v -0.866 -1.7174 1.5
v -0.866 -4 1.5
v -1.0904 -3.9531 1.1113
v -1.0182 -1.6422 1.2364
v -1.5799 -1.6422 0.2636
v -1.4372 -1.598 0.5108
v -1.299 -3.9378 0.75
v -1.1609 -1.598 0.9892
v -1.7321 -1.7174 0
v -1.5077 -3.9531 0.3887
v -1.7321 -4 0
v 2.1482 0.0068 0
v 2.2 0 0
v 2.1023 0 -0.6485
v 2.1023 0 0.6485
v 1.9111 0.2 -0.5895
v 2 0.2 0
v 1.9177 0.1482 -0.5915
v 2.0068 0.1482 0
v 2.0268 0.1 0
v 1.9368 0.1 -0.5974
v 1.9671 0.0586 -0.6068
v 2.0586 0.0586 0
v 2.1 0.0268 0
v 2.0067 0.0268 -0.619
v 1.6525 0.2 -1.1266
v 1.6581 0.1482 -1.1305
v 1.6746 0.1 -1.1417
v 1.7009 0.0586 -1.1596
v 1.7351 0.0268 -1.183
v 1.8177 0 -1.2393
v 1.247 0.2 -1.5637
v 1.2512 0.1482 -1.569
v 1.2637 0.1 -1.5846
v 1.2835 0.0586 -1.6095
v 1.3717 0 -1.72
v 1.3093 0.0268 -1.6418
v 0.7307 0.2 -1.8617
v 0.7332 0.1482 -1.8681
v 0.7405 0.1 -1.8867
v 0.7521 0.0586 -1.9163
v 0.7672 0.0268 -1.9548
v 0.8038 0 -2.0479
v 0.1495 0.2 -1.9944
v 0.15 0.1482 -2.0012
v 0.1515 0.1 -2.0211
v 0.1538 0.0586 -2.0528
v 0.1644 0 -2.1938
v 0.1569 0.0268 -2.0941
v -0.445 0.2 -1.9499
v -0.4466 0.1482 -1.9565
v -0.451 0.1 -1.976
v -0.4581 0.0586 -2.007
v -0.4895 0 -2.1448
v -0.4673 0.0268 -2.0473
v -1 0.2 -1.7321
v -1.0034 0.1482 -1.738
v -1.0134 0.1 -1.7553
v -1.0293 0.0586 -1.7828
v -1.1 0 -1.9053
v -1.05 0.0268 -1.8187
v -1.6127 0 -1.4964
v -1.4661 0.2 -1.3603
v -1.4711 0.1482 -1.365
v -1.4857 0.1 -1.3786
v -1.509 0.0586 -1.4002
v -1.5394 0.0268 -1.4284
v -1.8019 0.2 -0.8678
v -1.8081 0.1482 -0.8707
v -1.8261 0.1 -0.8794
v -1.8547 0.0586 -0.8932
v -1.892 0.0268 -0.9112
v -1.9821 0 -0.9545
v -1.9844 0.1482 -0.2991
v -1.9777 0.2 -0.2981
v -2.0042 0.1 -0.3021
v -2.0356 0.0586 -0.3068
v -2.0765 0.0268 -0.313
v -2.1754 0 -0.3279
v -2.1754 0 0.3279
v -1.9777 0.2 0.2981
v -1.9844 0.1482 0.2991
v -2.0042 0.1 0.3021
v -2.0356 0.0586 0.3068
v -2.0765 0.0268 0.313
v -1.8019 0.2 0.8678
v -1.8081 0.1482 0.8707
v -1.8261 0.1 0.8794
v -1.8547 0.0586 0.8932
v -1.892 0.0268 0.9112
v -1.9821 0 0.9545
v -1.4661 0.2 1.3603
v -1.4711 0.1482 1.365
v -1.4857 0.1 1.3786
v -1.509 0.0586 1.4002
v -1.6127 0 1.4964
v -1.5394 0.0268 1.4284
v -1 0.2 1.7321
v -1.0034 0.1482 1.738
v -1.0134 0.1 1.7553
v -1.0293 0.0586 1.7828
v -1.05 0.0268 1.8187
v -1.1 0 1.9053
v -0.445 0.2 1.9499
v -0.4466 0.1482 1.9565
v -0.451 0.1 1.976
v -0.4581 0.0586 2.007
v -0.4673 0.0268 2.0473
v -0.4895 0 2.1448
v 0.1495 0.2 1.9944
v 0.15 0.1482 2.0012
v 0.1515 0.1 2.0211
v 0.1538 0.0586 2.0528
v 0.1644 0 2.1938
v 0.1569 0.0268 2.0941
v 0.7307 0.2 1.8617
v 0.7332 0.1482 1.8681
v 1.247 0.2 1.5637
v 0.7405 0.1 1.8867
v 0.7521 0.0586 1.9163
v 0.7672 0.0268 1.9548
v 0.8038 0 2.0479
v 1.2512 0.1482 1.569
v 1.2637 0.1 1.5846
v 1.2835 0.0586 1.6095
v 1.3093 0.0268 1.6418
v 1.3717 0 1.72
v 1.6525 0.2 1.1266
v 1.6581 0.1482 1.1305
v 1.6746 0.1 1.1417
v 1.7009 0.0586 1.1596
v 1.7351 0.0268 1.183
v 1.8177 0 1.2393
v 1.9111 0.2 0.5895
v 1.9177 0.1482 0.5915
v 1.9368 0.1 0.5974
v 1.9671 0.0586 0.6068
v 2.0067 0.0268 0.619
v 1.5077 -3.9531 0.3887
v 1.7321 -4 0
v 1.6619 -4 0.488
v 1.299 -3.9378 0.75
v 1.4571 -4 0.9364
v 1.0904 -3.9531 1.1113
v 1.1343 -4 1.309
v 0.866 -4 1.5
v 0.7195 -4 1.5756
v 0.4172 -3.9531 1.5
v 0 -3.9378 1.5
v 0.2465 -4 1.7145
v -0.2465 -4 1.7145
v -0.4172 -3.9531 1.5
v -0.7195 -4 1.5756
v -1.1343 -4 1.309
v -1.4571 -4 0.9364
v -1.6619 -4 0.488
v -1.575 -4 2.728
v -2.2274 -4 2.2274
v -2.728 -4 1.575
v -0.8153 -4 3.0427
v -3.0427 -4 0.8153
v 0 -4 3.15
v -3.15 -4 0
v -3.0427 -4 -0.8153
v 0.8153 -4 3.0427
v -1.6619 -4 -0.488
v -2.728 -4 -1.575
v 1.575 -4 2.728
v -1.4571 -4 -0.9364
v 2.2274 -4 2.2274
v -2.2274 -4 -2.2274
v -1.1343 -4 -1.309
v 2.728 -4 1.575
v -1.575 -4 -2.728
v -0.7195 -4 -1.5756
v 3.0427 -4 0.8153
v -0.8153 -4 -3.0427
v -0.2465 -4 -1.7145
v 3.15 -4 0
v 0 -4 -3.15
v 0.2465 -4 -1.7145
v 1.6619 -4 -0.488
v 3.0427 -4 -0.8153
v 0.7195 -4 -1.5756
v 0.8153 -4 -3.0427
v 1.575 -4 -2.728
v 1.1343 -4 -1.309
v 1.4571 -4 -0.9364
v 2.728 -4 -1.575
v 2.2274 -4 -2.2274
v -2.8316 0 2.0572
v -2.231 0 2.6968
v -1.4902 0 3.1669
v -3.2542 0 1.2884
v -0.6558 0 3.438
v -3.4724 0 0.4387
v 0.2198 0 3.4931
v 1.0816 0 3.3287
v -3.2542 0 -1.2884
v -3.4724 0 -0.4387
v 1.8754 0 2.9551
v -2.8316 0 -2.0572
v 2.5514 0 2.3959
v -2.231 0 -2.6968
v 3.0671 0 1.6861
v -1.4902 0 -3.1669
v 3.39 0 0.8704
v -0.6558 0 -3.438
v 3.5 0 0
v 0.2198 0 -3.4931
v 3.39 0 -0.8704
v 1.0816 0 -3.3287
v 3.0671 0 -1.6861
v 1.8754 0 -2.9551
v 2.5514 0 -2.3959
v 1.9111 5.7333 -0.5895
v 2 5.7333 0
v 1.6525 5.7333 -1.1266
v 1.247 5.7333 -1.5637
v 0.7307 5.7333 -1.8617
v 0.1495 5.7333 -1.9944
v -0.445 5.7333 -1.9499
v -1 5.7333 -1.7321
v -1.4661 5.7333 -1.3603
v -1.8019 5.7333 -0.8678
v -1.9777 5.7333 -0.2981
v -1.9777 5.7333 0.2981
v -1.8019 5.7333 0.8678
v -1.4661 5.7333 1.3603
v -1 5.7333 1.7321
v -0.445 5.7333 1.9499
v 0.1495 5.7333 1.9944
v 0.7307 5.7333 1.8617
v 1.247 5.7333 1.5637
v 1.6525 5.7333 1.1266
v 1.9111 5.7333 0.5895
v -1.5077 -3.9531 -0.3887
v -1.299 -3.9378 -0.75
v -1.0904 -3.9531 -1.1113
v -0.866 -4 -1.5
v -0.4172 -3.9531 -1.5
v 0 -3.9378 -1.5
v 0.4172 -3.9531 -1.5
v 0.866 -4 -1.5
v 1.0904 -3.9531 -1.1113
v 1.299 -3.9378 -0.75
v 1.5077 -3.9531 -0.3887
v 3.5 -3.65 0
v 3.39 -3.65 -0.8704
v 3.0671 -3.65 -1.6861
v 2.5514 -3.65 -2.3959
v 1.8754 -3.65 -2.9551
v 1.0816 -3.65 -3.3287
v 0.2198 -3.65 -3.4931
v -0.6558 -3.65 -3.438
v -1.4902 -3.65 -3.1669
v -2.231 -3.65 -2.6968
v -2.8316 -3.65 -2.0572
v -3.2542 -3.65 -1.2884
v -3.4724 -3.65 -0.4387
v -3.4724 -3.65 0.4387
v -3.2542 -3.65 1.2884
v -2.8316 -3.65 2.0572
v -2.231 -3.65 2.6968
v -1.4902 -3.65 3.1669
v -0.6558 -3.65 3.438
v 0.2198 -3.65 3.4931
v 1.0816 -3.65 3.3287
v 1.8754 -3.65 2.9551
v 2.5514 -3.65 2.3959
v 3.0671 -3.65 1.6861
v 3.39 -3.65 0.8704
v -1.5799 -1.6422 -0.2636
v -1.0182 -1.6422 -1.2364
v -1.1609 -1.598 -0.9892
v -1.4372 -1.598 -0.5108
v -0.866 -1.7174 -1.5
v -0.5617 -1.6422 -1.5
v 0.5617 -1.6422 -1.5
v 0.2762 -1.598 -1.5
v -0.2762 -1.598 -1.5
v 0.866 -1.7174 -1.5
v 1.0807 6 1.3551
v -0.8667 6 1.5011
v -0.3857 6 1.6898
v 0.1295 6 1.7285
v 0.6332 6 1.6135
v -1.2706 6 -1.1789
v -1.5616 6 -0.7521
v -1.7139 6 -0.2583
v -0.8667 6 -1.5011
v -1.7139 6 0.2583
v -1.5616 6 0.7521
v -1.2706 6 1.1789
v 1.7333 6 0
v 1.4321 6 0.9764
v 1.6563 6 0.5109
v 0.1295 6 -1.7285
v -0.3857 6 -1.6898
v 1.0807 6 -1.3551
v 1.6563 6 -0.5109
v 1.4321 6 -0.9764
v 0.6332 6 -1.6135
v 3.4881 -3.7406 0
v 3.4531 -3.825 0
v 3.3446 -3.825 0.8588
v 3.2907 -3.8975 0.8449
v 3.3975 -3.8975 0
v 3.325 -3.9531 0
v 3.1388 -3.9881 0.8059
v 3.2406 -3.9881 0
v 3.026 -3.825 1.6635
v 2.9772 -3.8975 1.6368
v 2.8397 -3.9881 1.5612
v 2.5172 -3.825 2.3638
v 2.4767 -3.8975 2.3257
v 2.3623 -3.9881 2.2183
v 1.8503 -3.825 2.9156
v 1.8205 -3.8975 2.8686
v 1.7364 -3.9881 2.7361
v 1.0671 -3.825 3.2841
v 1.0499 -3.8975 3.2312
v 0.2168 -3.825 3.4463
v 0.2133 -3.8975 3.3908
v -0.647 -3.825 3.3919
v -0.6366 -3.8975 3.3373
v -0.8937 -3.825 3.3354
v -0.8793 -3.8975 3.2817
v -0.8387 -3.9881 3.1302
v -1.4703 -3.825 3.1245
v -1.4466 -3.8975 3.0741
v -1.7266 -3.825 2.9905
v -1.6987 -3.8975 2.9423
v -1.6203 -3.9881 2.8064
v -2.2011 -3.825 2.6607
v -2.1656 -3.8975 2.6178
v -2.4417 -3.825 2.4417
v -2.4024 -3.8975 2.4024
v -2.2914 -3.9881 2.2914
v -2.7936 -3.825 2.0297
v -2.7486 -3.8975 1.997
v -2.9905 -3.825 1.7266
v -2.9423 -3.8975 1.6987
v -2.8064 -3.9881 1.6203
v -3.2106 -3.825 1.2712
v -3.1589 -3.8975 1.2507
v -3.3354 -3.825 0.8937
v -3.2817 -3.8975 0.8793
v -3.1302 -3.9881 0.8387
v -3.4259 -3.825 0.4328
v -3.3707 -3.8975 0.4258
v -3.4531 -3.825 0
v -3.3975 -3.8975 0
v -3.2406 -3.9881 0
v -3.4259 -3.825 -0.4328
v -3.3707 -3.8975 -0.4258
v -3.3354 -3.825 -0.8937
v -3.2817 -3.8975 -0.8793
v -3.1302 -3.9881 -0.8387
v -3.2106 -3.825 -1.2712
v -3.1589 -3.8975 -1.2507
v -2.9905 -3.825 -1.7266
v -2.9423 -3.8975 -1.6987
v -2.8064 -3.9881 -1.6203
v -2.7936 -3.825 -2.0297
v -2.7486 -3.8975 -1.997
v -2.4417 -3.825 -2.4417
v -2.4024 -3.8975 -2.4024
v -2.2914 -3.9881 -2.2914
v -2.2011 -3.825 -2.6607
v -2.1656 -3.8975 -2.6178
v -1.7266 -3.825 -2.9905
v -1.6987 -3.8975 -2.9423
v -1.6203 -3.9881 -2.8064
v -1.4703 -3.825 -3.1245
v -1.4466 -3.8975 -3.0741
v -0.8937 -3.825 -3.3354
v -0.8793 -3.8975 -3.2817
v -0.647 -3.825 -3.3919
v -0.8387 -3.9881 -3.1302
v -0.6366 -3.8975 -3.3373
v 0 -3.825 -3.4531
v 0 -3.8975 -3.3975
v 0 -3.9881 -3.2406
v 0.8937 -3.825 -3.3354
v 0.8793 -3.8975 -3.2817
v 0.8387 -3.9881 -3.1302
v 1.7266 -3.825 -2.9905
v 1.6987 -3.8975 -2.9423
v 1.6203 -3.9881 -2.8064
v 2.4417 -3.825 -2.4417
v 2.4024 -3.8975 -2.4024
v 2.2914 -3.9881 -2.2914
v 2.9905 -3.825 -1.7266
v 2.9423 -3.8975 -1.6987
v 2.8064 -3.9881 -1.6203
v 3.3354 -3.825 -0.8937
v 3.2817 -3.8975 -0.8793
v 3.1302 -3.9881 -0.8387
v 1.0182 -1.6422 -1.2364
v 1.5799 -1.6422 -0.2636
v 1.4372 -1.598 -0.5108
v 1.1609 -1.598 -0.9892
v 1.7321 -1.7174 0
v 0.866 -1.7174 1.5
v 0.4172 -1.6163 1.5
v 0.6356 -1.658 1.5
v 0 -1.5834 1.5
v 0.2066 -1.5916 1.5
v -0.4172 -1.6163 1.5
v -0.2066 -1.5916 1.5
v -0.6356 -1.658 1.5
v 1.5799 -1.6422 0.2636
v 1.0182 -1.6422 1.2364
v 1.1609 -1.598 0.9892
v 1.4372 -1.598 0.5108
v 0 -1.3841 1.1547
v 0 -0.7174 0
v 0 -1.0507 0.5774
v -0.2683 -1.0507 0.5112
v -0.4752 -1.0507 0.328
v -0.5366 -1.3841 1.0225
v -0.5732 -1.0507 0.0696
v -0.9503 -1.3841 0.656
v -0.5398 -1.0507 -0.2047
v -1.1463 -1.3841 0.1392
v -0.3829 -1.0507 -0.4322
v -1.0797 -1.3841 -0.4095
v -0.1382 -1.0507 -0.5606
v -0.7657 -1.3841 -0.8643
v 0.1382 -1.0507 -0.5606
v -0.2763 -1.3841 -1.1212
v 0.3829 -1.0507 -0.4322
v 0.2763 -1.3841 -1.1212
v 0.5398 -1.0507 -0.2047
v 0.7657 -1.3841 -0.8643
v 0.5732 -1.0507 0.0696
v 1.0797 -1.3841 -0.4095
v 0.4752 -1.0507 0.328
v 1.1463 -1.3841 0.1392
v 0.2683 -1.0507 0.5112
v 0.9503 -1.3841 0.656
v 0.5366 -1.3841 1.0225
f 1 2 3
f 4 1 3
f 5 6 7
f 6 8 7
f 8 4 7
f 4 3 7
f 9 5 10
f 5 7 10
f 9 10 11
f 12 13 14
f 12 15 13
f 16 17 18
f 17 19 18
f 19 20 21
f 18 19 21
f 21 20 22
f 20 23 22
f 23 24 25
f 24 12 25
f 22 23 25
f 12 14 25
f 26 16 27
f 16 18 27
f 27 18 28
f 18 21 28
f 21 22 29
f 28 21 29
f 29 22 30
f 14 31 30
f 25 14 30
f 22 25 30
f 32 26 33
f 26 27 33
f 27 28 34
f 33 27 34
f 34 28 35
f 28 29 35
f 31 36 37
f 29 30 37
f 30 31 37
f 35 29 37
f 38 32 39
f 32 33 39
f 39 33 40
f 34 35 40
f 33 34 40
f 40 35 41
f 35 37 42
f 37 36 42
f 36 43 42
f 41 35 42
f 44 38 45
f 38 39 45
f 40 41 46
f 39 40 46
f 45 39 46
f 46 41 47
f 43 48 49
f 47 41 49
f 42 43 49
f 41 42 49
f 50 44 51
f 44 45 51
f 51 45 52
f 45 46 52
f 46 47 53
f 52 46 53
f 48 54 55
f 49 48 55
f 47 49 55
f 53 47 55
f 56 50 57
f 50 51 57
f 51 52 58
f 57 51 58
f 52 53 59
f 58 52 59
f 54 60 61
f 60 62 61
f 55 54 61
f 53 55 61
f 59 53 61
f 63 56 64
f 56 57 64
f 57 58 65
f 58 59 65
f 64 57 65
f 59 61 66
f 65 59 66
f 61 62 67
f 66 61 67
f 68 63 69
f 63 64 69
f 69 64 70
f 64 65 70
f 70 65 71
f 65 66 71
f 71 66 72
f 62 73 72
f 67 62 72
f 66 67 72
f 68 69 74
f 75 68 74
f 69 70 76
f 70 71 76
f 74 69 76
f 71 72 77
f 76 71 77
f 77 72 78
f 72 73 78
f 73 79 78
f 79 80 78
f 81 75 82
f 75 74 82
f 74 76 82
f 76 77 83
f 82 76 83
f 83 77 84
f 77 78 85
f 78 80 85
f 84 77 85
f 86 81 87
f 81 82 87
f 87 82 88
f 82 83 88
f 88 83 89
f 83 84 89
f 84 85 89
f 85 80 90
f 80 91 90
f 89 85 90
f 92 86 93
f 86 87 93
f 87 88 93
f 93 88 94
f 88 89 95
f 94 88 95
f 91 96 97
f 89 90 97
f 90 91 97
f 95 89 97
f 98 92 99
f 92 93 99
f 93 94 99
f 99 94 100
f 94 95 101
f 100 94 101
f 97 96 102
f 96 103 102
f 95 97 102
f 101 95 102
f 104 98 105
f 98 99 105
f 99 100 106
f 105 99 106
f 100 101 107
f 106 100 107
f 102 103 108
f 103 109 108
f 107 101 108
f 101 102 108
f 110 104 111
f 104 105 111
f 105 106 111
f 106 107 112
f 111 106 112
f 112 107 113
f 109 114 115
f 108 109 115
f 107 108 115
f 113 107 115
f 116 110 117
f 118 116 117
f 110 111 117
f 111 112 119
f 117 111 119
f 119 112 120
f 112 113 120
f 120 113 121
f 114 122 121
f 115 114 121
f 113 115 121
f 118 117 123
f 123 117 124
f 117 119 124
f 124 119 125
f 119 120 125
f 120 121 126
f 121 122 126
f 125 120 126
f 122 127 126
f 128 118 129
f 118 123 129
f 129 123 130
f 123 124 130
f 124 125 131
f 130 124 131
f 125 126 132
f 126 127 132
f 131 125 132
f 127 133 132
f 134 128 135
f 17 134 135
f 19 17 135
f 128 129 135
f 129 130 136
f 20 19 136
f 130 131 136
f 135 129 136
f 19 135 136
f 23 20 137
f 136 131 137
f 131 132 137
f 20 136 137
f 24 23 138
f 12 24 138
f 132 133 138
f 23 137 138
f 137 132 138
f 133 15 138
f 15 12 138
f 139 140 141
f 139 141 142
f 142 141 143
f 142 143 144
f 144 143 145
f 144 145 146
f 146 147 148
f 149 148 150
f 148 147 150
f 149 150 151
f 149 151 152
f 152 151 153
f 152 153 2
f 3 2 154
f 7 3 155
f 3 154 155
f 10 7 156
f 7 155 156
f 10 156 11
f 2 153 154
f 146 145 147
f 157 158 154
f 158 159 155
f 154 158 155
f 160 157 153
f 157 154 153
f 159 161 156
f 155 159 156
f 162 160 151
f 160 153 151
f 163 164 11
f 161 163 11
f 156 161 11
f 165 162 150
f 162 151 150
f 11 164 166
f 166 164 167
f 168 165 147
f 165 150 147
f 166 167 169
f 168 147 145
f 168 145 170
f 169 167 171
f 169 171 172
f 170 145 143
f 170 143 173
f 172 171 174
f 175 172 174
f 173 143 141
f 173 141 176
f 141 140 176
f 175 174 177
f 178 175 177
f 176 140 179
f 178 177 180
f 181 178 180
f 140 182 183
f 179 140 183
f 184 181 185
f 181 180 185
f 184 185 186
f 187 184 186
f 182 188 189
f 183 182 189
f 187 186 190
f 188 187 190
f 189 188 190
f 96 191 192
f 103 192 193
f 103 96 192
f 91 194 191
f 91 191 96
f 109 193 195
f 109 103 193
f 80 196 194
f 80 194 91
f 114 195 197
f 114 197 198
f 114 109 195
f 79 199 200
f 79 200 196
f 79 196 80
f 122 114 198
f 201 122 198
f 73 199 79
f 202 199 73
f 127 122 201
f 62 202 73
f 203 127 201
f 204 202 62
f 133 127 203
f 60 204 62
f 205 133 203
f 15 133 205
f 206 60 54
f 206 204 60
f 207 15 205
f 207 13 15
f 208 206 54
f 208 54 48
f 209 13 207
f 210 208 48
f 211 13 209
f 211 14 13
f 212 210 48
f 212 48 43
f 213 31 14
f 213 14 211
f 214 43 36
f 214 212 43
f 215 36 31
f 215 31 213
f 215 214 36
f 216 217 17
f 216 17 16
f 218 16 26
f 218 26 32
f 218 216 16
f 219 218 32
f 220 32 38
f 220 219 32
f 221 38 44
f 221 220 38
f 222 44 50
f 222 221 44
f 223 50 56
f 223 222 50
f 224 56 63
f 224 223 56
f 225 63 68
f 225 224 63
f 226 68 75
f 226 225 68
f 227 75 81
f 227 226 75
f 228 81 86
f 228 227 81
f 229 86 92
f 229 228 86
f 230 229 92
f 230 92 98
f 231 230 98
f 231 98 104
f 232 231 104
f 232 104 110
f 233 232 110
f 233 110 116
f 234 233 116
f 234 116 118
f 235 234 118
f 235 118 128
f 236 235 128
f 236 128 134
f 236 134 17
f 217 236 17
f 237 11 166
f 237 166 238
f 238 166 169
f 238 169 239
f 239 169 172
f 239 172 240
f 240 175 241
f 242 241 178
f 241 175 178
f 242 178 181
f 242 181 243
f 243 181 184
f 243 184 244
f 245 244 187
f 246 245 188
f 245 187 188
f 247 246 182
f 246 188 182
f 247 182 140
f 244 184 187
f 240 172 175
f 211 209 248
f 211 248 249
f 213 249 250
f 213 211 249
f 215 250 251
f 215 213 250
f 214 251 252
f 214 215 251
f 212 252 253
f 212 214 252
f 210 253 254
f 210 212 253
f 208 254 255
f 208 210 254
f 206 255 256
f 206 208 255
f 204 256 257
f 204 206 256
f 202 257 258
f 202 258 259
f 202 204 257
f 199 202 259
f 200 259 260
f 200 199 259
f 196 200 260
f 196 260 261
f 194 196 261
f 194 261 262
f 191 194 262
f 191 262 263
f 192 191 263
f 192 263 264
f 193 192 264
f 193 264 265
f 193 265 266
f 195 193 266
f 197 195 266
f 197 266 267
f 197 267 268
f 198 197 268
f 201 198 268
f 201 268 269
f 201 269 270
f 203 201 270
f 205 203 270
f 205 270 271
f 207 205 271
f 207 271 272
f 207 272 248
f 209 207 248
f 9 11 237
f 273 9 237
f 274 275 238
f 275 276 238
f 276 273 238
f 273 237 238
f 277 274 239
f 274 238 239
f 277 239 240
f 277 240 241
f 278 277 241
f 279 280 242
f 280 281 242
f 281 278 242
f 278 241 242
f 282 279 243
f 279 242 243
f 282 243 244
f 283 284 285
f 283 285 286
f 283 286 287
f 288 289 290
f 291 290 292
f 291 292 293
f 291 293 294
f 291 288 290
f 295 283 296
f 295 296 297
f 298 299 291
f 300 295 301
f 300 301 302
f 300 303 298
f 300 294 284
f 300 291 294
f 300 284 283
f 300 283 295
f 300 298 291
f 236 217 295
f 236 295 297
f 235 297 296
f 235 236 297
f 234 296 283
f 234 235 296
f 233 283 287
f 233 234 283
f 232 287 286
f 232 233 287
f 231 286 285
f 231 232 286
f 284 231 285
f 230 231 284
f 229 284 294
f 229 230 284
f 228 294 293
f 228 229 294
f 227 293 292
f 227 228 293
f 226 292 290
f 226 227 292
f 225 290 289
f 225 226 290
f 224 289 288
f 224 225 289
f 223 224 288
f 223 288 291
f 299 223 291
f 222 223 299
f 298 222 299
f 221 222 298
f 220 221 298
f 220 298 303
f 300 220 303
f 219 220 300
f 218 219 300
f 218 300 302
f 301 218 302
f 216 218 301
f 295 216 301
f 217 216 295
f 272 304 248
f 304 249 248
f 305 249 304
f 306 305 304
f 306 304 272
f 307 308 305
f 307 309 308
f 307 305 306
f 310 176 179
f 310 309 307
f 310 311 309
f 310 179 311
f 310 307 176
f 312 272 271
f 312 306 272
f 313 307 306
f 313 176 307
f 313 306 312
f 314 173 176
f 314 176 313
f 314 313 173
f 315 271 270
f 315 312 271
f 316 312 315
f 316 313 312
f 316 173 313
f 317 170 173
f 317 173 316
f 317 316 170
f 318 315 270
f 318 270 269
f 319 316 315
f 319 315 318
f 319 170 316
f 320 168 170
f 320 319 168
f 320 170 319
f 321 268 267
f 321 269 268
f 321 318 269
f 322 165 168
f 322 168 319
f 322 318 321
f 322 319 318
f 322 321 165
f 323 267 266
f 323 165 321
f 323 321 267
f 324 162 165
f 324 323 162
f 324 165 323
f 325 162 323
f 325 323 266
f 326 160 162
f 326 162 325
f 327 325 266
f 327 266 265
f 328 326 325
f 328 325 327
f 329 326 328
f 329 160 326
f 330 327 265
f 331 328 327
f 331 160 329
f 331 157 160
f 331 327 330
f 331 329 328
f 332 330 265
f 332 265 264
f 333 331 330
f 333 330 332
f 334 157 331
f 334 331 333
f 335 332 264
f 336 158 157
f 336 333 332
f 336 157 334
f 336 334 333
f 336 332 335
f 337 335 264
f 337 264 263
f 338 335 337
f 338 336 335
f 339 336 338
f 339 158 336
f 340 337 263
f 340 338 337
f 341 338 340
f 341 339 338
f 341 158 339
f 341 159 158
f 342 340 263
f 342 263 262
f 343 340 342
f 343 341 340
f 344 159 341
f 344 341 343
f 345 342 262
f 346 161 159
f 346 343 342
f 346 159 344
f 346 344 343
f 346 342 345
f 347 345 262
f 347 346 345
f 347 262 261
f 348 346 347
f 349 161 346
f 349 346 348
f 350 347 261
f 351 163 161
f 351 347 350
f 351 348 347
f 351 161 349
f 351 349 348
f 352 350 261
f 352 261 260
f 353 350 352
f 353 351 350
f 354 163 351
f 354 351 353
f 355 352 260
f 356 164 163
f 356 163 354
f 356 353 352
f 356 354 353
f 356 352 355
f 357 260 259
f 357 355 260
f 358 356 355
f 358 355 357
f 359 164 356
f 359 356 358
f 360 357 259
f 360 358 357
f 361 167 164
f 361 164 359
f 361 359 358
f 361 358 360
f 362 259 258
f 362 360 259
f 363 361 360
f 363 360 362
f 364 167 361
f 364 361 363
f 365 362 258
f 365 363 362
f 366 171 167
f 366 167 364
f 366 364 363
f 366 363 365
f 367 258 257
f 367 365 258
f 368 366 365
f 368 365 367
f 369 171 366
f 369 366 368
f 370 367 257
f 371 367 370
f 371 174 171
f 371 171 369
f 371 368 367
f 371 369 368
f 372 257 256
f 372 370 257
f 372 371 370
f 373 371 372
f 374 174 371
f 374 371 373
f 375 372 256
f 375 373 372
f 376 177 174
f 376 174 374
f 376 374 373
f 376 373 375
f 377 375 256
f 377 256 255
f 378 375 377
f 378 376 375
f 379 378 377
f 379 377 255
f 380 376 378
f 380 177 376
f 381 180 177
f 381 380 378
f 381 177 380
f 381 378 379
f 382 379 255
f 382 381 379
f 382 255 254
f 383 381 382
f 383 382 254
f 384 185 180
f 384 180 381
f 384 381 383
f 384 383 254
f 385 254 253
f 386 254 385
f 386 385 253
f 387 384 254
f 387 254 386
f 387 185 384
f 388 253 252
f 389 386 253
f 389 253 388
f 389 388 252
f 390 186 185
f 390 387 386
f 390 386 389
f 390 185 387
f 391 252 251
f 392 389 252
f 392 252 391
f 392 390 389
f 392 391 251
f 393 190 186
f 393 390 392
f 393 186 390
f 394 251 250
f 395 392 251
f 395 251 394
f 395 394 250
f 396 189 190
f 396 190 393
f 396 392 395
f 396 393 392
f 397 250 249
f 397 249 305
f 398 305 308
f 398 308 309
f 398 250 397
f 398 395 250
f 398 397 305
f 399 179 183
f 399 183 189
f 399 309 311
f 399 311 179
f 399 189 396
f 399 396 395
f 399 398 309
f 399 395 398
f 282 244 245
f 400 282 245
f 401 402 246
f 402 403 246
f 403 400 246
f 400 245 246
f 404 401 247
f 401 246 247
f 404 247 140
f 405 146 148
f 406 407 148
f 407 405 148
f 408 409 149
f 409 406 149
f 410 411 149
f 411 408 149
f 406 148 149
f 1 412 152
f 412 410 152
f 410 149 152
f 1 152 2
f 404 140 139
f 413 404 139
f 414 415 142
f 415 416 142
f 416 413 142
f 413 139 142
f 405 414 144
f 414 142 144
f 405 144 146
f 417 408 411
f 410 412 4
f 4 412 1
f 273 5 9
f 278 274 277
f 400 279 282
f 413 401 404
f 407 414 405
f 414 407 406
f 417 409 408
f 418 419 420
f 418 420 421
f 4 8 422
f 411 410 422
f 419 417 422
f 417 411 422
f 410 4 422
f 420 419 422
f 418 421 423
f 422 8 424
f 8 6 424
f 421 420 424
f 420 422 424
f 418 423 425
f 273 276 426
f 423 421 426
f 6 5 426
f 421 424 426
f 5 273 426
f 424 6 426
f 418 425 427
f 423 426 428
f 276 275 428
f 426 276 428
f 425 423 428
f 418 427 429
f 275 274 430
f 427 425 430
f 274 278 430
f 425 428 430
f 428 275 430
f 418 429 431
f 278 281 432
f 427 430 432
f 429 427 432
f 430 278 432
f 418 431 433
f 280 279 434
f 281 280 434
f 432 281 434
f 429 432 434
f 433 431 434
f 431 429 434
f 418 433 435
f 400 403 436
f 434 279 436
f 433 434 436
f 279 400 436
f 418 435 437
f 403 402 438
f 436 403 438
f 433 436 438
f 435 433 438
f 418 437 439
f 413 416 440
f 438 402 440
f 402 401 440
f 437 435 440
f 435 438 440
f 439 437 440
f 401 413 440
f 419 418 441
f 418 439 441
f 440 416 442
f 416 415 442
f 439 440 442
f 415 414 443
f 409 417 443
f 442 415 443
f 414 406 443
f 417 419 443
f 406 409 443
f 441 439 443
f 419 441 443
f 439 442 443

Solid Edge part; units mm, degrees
sketch "Sketch1" plane through (0, 0, 0) normal (0, 0, 1) x (1, 0, 0)
  line L0 (2, 0) -> (2, 6)
  line L1 (0, 6) -> (2, 6)
  line L2 (0, 0) -> (0, 6)
  line L3 (0, 0) -> (0, -4)
  line L4 (0, -4) -> (3.5, -4)
  line L5 (3.5, -4) -> (3.5, 0)
  line L6 (3.5, 0) -> (2, 0)
revolve "RevolvedProtrusion1" add sketch "Sketch1" angle 360 about axis through (0, 0, 0) along (0, 1, 0)
sketch "Sketch2" plane through (0, 0, 0) normal (1, 0, 0) x (0, 1, 0)
  line L0 (-4, 2.2215) -> (-2, 2.2215)
  line L1 (-0.7174, 0) -> (-2, 2.2215)
  line L2 (-4, 0) -> (-0.7174, 0)
  line L3 (-4, 0) -> (-4, 2.2215)
revolve "RevolvedCutout1" cut sketch "Sketch2" angle 360 about axis through (0, -4.5, 0) along (0, 1, 0)
sketch "Sketch3" plane through (0, -4, 0) normal (0, -1, 0) x (0, 0, 1)
  circle A0 centre (0, 0) radius 2.2215
  line L0 (-1.5, -0.866) -> (0, -1.7321)
  line L1 (0, -1.7321) -> (1.5, -0.866)
  line L2 (1.5, -0.866) -> (1.5, 0.866)
  line L3 (1.5, 0.866) -> (0, 1.7321)
  line L4 (0, 1.7321) -> (-1.5, 0.866)
  line L5 (-1.5, 0.866) -> (-1.5, -0.866)
  dimension "D1" = 3
extrude "Protrusion1" add sketch "Sketch3" against normal up to next
sketch "Sketch4" plane through (0, 0, 0) normal (0, 0, 1) x (1, 0, 0)
  line L0 (-1.7321, -4) -> (0, -4)
  line L1 (0, -4) -> (0, -3.5359)
  line L2 (0, -3.5359) -> (-1.7321, -4)
revolve "RevolvedCutout2" cut sketch "Sketch4" angle 360 about axis through (0, -4.5, 0) along (0, 1, 0)
fillet "Round1" radius 0.2 1 edges at (0, 0, -2)
fillet "Round2" radius 0.35 1 edges at (0, -4, -3.5)
chamfer "倒斜角_2" distance 0.2667 angle 45 1 edges at (0, 6, -2)
cosmetic_thread "螺纹_3" size "M4" thread depth 4.8
